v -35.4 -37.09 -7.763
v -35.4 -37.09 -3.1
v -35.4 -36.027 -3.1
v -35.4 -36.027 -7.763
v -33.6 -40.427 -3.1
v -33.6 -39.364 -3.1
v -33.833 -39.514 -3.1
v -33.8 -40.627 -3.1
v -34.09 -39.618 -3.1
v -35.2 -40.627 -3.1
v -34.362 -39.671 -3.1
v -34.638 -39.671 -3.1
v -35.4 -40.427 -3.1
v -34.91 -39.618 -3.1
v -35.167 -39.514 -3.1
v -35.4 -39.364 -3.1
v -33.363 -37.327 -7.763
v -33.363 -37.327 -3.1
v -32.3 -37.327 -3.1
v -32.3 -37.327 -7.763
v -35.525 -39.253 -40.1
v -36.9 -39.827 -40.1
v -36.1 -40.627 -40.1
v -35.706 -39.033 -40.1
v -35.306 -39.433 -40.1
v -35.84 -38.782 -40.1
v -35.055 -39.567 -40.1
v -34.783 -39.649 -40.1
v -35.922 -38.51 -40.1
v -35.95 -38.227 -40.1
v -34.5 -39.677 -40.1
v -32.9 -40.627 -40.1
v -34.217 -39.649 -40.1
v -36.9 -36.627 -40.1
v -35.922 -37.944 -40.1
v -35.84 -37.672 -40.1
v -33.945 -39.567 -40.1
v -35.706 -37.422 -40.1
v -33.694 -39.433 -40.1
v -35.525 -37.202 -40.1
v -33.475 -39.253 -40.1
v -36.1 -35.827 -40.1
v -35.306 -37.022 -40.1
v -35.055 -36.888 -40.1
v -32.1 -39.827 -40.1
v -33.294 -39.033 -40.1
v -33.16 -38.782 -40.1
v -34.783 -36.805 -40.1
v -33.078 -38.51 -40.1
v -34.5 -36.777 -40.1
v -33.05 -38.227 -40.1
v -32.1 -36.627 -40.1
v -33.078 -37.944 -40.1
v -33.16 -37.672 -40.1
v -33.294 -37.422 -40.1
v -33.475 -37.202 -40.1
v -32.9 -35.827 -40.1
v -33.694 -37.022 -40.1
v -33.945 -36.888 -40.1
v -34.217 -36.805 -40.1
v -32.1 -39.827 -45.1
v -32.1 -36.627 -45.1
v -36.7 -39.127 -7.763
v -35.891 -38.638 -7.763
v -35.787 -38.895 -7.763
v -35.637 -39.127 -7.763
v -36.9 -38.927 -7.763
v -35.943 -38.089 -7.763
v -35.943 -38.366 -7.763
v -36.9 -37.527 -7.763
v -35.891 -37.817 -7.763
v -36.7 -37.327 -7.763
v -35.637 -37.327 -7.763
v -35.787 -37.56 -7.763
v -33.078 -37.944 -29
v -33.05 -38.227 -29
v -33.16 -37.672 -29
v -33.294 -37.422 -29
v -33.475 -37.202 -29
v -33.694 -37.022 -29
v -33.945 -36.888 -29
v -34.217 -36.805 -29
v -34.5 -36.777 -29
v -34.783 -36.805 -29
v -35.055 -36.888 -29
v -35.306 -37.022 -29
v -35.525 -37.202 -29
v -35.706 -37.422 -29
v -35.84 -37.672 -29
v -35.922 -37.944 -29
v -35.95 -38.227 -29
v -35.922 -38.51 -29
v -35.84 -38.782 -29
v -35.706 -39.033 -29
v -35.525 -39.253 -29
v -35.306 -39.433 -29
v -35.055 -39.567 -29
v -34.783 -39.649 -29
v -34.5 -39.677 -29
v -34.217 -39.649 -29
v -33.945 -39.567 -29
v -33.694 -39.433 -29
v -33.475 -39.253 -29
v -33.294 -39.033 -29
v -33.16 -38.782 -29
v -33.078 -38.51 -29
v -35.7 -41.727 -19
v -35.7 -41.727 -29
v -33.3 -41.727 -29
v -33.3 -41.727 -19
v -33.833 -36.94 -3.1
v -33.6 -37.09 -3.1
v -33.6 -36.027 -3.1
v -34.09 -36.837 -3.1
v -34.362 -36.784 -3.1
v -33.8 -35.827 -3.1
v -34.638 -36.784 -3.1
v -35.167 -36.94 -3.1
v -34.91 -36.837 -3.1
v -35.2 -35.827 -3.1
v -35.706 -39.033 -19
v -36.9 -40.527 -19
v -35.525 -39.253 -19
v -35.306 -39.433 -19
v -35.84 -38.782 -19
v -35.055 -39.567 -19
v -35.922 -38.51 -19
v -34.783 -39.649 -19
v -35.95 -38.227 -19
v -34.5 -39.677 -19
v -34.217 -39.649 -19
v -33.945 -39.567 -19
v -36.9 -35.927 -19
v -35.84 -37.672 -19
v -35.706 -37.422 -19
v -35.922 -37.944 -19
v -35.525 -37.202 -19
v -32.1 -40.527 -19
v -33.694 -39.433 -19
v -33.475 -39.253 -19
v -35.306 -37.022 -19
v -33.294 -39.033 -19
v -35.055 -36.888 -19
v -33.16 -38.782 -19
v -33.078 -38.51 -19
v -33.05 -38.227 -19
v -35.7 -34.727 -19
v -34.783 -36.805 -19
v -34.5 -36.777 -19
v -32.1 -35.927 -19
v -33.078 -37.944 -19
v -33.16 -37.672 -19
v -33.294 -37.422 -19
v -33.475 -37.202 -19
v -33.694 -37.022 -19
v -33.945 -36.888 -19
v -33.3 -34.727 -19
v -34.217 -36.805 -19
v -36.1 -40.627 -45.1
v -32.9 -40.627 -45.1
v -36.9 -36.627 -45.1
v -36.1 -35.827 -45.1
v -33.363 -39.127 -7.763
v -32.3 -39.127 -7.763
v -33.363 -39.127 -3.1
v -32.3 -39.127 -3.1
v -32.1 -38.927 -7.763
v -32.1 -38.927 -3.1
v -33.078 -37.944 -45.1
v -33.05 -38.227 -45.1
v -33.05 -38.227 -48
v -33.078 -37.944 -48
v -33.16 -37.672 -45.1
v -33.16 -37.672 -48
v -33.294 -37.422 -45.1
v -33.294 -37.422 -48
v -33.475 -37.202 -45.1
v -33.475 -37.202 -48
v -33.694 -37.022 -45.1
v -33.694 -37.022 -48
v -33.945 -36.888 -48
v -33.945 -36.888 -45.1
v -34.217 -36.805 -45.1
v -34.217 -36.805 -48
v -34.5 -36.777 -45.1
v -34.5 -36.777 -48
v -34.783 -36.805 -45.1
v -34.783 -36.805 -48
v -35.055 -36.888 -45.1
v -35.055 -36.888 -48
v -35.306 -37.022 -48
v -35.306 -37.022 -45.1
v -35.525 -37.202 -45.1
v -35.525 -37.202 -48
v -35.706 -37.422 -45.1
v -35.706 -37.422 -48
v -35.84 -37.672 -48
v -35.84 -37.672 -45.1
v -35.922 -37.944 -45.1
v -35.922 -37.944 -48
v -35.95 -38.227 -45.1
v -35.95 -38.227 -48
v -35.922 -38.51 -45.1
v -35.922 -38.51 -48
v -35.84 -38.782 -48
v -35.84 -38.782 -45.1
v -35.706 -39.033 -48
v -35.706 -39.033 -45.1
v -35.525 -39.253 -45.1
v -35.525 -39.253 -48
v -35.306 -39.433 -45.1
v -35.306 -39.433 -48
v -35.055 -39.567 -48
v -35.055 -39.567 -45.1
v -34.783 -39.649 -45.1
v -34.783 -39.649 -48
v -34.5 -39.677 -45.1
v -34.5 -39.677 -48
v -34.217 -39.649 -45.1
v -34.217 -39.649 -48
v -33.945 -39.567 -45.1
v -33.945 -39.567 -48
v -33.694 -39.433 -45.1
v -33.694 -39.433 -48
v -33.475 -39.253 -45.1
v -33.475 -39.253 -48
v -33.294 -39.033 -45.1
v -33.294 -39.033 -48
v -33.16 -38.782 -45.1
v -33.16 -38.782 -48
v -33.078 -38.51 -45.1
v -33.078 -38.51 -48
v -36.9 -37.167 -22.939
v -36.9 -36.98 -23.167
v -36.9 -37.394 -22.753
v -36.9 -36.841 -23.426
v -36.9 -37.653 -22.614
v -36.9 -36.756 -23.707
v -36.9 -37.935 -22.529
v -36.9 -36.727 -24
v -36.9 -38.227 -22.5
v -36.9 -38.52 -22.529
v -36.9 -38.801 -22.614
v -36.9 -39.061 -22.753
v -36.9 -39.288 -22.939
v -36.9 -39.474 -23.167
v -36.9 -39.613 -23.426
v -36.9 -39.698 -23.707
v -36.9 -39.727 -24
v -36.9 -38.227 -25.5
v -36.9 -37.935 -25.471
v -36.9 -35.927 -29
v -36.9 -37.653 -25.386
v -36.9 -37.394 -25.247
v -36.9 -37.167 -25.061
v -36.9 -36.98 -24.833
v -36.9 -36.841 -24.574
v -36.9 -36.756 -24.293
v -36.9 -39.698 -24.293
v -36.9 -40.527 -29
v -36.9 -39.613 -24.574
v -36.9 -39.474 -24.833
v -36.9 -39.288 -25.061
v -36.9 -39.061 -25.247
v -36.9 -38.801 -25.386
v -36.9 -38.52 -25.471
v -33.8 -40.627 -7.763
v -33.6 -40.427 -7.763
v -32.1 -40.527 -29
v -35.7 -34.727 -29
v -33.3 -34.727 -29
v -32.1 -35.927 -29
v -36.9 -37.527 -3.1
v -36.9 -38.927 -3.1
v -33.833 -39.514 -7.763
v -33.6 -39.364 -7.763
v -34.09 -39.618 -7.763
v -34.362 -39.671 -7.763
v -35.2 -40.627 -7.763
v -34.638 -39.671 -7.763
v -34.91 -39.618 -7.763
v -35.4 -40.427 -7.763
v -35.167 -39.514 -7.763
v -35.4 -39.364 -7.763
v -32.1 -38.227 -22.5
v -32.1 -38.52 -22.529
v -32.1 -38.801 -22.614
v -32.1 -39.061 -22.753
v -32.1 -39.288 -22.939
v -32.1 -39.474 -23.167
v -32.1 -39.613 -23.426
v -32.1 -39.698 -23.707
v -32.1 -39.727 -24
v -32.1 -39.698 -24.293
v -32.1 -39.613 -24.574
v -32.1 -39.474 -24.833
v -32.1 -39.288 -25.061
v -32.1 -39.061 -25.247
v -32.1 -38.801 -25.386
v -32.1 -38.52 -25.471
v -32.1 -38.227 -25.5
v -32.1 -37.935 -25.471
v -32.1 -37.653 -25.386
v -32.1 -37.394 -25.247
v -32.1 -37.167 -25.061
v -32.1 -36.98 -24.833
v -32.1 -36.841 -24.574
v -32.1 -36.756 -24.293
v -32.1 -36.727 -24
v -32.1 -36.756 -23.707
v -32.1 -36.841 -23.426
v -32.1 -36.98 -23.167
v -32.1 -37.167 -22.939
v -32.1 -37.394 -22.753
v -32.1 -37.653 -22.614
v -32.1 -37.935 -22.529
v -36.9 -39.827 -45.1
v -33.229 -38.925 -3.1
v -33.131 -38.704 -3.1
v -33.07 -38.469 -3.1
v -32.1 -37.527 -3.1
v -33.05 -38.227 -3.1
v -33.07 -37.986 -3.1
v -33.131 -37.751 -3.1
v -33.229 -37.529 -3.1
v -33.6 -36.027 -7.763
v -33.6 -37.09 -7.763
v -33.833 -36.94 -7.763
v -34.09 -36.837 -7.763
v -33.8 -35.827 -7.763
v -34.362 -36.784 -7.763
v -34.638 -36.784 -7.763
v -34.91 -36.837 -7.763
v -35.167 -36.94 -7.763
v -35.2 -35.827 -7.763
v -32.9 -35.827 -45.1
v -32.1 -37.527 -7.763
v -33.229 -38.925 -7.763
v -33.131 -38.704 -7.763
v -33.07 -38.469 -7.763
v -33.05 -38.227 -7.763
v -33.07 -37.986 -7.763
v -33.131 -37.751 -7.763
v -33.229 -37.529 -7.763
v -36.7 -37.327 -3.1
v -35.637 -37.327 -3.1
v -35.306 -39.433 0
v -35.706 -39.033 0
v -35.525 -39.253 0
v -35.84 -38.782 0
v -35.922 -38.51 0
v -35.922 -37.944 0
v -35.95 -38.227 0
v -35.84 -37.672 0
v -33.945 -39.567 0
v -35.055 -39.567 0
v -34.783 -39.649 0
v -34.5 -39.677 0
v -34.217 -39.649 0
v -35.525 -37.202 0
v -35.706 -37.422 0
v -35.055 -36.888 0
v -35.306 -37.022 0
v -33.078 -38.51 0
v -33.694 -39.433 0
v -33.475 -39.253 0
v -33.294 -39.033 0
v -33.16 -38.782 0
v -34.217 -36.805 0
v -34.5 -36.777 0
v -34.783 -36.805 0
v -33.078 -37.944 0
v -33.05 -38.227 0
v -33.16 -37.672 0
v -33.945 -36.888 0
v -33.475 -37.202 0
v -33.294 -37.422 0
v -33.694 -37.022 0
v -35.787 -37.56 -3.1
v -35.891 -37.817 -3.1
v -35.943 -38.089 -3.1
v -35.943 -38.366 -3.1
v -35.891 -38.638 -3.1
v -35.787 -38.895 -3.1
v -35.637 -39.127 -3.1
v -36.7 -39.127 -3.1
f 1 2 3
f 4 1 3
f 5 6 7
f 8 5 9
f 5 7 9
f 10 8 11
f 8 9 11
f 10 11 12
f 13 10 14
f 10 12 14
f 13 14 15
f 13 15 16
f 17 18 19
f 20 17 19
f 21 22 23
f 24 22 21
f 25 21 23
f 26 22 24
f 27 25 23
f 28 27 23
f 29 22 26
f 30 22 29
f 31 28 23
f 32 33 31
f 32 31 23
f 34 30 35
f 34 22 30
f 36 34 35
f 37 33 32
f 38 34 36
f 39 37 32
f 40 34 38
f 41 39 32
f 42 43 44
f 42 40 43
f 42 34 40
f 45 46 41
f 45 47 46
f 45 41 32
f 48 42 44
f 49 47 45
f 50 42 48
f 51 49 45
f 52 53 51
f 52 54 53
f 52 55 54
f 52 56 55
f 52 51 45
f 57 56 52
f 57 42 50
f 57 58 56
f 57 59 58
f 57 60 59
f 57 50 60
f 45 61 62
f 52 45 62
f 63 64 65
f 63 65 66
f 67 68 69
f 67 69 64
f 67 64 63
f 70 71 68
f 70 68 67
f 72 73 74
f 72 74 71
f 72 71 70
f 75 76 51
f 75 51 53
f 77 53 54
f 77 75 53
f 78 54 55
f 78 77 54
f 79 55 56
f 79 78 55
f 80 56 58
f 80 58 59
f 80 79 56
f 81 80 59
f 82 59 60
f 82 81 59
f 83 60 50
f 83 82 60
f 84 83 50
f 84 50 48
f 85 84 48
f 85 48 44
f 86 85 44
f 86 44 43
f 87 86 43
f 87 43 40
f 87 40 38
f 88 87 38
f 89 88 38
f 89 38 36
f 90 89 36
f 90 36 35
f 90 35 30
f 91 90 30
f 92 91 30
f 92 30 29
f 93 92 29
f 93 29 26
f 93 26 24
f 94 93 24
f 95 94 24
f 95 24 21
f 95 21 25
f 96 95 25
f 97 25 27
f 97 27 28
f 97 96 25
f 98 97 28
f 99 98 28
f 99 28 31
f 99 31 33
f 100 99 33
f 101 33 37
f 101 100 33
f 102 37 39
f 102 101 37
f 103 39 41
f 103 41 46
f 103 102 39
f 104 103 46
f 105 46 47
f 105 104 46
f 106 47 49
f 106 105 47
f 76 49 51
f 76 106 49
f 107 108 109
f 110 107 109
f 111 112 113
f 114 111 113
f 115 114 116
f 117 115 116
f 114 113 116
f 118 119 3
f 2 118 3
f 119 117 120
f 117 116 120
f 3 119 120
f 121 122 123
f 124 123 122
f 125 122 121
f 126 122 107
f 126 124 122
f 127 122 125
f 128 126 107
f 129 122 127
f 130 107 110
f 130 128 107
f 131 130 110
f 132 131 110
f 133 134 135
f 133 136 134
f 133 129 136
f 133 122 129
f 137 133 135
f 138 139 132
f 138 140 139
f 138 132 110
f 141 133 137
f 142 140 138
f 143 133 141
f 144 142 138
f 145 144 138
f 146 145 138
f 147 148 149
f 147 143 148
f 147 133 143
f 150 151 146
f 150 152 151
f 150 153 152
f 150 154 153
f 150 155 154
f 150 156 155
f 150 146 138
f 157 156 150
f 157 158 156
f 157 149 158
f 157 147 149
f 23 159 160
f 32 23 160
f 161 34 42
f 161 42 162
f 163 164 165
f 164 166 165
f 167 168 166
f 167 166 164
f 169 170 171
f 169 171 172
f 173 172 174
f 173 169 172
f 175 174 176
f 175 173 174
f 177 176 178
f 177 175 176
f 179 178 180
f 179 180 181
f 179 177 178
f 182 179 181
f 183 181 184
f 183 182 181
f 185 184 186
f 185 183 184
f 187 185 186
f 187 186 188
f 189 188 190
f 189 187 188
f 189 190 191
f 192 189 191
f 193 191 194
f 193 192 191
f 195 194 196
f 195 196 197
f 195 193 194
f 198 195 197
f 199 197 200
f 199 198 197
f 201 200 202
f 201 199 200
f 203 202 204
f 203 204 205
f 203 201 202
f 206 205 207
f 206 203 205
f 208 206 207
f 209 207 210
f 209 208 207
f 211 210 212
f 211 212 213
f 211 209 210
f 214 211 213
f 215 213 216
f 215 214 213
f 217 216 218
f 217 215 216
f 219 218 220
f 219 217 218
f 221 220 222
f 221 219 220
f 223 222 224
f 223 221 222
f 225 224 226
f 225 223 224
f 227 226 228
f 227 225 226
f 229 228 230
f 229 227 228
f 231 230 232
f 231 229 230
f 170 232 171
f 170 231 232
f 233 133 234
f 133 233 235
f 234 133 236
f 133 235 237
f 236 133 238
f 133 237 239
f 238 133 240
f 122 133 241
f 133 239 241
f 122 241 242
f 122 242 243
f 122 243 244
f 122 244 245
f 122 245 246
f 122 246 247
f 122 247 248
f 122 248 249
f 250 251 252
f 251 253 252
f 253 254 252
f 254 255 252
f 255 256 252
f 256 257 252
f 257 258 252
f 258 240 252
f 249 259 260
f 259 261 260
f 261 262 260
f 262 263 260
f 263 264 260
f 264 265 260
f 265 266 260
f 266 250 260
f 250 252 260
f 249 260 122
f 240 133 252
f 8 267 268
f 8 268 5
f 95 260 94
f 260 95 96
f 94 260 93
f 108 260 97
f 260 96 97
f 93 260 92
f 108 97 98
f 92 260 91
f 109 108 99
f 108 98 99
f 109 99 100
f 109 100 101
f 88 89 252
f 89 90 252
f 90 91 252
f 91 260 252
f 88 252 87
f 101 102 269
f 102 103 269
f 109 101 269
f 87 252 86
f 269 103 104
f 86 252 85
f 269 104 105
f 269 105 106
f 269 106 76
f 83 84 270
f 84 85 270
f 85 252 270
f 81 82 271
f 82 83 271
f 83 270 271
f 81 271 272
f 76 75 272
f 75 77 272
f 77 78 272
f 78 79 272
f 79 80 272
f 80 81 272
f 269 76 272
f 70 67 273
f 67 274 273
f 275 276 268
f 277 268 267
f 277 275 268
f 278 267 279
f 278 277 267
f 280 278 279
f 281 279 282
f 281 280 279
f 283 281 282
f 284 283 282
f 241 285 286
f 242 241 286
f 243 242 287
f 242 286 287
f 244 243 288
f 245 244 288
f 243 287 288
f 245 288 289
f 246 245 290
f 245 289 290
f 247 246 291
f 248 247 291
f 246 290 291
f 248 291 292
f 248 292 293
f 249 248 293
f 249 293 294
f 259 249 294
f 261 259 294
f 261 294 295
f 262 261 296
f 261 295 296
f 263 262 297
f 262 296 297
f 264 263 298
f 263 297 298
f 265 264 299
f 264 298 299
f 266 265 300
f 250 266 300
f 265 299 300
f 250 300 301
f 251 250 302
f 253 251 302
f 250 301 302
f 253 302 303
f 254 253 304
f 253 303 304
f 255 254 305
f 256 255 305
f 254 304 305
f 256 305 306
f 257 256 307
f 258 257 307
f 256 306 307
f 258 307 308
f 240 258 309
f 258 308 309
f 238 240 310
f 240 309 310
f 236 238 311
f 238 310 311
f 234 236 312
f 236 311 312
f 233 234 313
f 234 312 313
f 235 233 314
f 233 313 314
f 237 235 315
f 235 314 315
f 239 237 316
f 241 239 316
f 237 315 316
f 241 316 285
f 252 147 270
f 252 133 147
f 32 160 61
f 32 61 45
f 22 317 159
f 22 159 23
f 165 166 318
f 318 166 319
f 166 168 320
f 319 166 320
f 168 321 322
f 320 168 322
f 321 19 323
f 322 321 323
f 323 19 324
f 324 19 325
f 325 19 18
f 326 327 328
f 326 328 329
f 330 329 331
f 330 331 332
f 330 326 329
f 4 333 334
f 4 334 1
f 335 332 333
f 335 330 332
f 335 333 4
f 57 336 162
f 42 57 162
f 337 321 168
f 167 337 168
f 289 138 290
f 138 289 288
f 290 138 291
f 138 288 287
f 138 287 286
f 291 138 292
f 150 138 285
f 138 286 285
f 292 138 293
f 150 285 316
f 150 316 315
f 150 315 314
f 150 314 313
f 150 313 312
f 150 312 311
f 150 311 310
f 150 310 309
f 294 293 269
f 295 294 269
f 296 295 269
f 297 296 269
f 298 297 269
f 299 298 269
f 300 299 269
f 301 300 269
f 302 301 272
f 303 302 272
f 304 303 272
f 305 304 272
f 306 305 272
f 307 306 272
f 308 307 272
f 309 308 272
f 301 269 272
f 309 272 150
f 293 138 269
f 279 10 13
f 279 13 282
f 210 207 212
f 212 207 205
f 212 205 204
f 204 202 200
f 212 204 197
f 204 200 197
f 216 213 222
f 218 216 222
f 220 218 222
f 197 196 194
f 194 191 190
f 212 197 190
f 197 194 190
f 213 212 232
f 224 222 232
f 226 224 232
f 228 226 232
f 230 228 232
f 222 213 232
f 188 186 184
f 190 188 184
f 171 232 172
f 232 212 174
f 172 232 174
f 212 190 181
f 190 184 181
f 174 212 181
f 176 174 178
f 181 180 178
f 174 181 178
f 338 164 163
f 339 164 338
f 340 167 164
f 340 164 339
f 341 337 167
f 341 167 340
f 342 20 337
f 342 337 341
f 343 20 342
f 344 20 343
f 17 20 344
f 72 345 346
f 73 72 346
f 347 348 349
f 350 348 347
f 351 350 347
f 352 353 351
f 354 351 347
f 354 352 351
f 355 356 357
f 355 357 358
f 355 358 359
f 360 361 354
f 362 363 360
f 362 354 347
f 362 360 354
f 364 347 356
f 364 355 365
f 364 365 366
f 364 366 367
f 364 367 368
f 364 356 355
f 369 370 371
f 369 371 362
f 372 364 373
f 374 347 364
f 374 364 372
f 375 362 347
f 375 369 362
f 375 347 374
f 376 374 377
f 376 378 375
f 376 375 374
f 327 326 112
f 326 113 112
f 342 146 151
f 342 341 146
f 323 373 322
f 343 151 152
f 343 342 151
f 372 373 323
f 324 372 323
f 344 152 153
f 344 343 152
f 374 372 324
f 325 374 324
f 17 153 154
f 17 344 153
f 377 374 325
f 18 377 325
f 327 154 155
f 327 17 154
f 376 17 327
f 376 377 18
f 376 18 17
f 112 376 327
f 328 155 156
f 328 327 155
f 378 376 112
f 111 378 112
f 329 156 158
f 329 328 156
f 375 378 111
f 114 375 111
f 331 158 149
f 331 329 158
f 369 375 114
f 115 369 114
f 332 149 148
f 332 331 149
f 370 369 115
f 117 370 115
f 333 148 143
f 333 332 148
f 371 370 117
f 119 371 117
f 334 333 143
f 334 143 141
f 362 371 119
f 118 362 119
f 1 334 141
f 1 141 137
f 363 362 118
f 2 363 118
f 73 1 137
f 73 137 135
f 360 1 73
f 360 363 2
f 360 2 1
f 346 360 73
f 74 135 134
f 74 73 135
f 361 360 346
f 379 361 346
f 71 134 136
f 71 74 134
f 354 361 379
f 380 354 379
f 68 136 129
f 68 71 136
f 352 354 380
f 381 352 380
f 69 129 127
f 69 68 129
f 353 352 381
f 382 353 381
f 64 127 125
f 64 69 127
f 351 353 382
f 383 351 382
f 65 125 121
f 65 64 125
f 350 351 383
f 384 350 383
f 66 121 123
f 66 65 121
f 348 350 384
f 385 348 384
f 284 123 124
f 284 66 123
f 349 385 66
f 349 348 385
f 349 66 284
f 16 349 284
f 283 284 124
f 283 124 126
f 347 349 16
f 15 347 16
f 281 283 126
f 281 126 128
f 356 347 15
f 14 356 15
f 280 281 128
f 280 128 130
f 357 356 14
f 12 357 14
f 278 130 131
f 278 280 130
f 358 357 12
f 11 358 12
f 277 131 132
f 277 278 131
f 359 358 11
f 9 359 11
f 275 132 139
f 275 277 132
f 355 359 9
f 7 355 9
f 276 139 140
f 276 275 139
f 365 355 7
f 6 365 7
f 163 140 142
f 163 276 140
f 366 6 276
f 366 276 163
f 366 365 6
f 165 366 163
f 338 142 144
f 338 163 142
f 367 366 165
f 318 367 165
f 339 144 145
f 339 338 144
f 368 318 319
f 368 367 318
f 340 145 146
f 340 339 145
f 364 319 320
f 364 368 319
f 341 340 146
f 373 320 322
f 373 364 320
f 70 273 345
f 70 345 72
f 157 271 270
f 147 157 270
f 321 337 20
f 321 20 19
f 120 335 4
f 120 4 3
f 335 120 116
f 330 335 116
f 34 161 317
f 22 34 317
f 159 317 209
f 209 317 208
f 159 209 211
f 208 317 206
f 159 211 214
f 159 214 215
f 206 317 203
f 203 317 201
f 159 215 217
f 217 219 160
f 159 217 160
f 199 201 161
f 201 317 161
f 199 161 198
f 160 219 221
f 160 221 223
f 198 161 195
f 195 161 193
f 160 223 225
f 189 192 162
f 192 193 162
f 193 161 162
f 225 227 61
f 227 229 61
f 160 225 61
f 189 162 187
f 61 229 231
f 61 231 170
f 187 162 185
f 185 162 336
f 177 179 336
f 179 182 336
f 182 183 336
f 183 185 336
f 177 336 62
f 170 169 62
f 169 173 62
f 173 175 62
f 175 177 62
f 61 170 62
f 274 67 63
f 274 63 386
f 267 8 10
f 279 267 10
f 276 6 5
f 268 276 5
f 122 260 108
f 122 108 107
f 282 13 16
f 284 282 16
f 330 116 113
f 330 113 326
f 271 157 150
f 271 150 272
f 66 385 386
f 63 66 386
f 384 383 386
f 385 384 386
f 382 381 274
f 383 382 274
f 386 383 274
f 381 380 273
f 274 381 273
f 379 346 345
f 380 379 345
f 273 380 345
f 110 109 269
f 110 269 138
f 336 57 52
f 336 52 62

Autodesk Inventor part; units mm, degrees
ref_plane "Plano de trabajo1" through (0, 0, 0) normal (0, 0, 1) x (1, 0, 0)
sketch "Boceto1" plane through (0, 0, 0) normal (0, 0, 1) x (1, 0, 0)
  circle A0 centre (-34.5, -38.2272) radius 1.45
  point P0 (0, 0)
  dimension "d0" = 2.9
ref_plane "Plano de trabajo2" through (-44.5, -51.5, -48) normal (0, 0, -1) x (0, 1, 0)
extrude "Extrusión1" add sketch "Boceto1" against normal up to surface (48 mm away)
ref_plane "Plano de trabajo3" through (0, 0, -45.1) normal (0, 0, 1) x (1, 0, 0)
sketch "Boceto2" plane through (0, 0, -45.1) normal (0, 0, 1) x (1, 0, 0)
  line L0 (-32.1, -35.8272) -> (-36.9, -35.8272)
  line L1 (-36.9, -35.8272) -> (-36.9, -40.6272)
  line L2 (-36.9, -40.6272) -> (-32.1, -40.6272)
  line L3 (-32.1, -40.6272) -> (-32.1, -35.8272)
  line L4 (-32.1, -35.8272) -> (-36.9, -40.6272) construction
  line L5 (-36.9, -35.8272) -> (-32.1, -40.6272) construction
  point P0 (0, 0)
  point P1 (-34.5, -38.2272)
  dimension "d3" = 4.8
  dimension "d4" = 4.8
extrude "Extrusión2" add sketch "Boceto2" along normal blind 5
chamfer "Chaflán1" distance 0.8 angle 45 4 edges at (-36.9, -40.6272, -42.6) (-36.9, -35.8272, -42.6) (-32.1, -35.8272, -42.6) (-32.1, -40.6272, -42.6)
ref_plane "Plano de trabajo4" through (0, 0, -3.1) normal (0, 0, -1) x (-1, 0, 0)
sketch "Boceto3" plane through (0, 0, -3.1) normal (0, 0, -1) x (-1, 0, 0)
  line L0 (32.1, -39.1272) -> (36.9, -39.1272)
  line L1 (36.9, -39.1272) -> (36.9, -37.3272)
  line L2 (36.9, -37.3272) -> (32.1, -37.3272)
  line L3 (32.1, -37.3272) -> (32.1, -39.1272)
  line L4 (32.1, -39.1272) -> (36.9, -37.3272) construction
  line L5 (36.9, -39.1272) -> (32.1, -37.3272) construction
  line L6 (33.6, -40.6272) -> (35.4, -40.6272)
  line L7 (35.4, -40.6272) -> (35.4, -35.8272)
  line L8 (35.4, -35.8272) -> (33.6, -35.8272)
  line L9 (33.6, -35.8272) -> (33.6, -40.6272)
  line L10 (33.6, -40.6272) -> (35.4, -35.8272) construction
  line L11 (35.4, -40.6272) -> (33.6, -35.8272) construction
  circle A0 centre (34.5, -38.2272) radius 1.4
  point P0 (0, 0)
  point P1 (35.5724, -37.3272)
  point P2 (35.4, -37.1548)
  point P3 (33.6, -37.1548)
  point P4 (33.4276, -37.3272)
  point P5 (33.4276, -39.1272)
  point P6 (33.6, -39.2996)
  point P7 (35.4, -39.2996)
  point P8 (35.5724, -39.1272)
  dimension "d12" = 1.8
  dimension "d13" = 4.8
  dimension "d14" = 2.8
ref_plane "Plano de trabajo5" through (-39.1917, -42.9189, -7.7627) normal (0, 0, -1) x (0, 1, 0)
extrude "Extrusión3" add sketch "Boceto3" along normal up to surface (4.6627 mm away)
chamfer "Chaflán2" distance 0.2 angle 45 8 edges at (-35.4, -35.8272, -5.4314) (-36.9, -37.3272, -5.4314) (-36.9, -39.1272, -5.4314) (-35.4, -40.6272, -5.4314) (-33.6, -40.6272, -5.4314) (-33.6, -35.8272, -5.4314) (-32.1, -37.3272, -5.4314) (-32.1, -39.1272, -5.4314)
ref_plane "Plano de trabajo6" through (-34.5, -38.2272, -24) normal (0, 0, 1) x (1, 0, 0)
sketch "Boceto4" plane through (-34.5, -38.2272, -24) normal (0, 0, 1) x (1, 0, 0)
  circle A0 centre (0, 0) radius 1.55 construction
  line L0 (2.4, 3.5) -> (-2.4, 3.5)
  line L1 (-2.4, 3.5) -> (-2.4, -3.5)
  line L2 (-2.4, -3.5) -> (2.4, -3.5)
  line L3 (2.4, -3.5) -> (2.4, 3.5)
  line L4 (2.4, 3.5) -> (-2.4, -3.5) construction
  line L5 (-2.4, 3.5) -> (2.4, -3.5) construction
  point P0 (34.5, 38.2272)
  dimension "d20" = 7
  dimension "d26" = 4.8
extrude "Extrusión4" add sketch "Boceto4" along normal mid plane 10
chamfer "Chaflán3" distance 1.2 angle 45 4 edges at (-36.9, -34.7272, -24) (-36.9, -41.7272, -24) (-32.1, -34.7272, -24) (-32.1, -41.7272, -24)
sketch "Boceto5" plane through (-36.9, -40.5272, -19) normal (-1, 0, 0) x (0, 0, 1)
  line L0 (-5, 48.8726) -> (-5, -9.5454) construction
  line L1 (-5, 2.3) -> (-5, -1.2) construction
  line L2 (-10, -1.2) -> (0, -1.2) construction
  line L3 (-5, 2.3) -> (-5, 5.8) construction
  line L4 (-10, 5.8) -> (0, 5.8) construction
  point P0 (19, 40.5272)
hole "Agujero1" at (-36.9, -38.2272, -24) direction (1, 0, 0) diameter 3 end through all
properties part number "EjeEngraneGrua"
